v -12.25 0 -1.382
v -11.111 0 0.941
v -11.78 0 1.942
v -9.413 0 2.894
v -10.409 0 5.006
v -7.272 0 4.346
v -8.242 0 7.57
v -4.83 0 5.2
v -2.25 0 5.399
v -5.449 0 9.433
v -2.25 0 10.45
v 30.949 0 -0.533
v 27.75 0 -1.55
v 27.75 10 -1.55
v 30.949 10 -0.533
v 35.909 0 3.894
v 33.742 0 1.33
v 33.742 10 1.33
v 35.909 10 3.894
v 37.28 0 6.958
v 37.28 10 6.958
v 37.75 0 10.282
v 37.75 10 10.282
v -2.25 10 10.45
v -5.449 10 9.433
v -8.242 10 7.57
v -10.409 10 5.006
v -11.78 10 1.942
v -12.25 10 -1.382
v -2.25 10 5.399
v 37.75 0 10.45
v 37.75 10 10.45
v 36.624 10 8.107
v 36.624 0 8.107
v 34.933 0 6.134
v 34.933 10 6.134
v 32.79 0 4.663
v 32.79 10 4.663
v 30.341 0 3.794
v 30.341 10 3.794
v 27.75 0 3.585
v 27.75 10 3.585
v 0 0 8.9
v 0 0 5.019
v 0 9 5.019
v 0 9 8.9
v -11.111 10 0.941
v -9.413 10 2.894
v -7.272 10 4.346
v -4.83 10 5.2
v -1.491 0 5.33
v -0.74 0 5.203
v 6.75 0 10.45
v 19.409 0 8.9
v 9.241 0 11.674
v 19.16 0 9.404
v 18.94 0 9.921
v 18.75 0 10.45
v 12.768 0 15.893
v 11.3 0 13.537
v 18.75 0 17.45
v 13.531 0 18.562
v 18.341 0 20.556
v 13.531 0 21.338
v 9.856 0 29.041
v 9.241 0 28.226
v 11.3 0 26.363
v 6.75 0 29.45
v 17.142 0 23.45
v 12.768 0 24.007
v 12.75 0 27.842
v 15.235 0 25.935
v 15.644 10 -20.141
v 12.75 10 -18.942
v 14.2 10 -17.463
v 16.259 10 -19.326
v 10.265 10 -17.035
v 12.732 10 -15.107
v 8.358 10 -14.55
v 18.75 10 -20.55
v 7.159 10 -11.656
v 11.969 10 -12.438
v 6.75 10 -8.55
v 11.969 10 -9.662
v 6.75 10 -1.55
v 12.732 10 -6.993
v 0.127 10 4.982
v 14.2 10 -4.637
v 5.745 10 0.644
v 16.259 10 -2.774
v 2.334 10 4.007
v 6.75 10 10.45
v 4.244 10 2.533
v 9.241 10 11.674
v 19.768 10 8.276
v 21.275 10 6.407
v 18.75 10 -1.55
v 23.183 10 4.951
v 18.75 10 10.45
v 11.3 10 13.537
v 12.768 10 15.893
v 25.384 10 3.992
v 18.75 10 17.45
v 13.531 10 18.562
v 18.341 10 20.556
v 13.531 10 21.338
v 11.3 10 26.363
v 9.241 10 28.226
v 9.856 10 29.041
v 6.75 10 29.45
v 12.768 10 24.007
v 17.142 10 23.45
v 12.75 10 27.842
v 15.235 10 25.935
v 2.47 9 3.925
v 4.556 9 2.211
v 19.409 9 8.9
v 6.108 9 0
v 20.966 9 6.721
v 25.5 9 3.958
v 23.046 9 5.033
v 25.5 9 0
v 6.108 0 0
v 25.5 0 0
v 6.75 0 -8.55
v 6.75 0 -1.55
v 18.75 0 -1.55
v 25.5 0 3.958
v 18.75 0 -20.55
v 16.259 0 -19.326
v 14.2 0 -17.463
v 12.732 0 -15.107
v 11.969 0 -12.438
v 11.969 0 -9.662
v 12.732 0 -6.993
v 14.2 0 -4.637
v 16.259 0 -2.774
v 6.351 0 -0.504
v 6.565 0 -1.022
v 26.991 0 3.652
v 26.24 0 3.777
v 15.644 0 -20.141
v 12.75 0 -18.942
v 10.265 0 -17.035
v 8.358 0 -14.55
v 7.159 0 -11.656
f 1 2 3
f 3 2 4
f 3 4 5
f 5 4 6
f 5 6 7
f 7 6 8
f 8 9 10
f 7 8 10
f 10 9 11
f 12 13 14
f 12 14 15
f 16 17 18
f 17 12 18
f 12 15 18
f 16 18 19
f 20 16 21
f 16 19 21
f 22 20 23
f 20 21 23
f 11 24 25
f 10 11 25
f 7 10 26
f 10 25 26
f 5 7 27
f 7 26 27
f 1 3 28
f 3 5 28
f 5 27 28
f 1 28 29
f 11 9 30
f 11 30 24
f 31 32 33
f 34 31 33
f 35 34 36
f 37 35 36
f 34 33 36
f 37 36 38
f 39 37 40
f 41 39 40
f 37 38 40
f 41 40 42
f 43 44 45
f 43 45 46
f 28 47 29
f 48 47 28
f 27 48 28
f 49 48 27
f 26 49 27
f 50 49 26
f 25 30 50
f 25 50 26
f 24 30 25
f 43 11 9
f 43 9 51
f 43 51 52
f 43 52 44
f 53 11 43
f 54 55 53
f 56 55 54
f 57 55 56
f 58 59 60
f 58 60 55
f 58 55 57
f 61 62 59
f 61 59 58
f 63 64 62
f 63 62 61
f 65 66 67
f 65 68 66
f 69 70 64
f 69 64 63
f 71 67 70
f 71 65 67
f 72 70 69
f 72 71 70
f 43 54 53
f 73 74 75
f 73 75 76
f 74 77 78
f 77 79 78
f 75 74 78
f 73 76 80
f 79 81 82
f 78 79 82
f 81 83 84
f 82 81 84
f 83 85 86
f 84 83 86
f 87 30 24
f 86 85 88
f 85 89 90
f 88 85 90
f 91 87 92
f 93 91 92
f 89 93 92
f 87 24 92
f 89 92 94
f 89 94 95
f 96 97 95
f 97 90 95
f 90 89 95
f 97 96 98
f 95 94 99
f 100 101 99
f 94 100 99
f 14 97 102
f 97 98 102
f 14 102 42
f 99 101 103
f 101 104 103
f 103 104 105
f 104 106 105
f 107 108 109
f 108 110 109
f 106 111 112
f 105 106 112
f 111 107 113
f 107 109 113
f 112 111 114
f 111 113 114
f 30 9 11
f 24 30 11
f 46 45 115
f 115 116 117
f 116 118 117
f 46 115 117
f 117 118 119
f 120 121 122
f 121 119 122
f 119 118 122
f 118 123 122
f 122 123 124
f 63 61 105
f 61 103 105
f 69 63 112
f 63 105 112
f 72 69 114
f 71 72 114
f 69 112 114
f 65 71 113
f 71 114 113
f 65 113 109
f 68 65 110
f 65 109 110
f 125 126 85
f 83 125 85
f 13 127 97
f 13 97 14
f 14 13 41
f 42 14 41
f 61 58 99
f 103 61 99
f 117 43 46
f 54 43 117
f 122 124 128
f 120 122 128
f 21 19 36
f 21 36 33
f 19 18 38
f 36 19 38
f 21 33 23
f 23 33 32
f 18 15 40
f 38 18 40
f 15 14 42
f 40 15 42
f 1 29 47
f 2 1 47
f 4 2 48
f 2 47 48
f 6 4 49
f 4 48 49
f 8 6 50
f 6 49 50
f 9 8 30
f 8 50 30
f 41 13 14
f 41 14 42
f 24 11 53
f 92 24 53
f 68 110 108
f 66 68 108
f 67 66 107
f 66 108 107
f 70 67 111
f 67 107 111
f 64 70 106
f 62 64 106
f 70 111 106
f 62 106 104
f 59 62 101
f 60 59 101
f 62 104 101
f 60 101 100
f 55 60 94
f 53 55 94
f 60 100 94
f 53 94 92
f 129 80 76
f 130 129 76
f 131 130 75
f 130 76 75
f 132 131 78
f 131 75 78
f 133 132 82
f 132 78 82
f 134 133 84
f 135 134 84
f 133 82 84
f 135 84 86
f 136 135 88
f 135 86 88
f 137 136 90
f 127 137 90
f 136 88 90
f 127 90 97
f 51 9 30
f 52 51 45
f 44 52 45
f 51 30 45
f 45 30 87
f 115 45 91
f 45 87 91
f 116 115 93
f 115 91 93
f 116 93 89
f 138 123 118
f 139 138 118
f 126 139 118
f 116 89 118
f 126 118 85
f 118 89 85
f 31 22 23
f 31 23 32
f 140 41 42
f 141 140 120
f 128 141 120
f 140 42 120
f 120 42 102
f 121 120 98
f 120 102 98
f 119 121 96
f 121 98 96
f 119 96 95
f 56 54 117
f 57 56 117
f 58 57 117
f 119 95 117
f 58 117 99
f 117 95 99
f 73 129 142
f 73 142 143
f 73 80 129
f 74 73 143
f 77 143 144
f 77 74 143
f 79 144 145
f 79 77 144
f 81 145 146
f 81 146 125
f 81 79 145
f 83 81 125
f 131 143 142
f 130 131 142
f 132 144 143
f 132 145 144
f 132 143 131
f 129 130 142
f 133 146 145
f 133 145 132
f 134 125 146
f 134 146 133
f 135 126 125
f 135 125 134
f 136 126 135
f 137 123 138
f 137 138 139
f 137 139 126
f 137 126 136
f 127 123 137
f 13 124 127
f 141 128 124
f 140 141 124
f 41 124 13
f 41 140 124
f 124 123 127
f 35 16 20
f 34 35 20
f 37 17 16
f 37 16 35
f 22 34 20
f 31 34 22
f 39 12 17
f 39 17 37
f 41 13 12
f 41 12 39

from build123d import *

# Parameters (mm, degrees)
F0_W           = 25.5
F0_H           = 8.9
F1_DEPTH       = 8.9
F2_W           = 30
F2_H           = 12
F2_W_2         = 25.5
F2_H_2         = 8.9
F3_DEPTH       = 10
F4_DEPTH       = 9
F5_DEPTH       = 10
F6_DEPTH       = 10
F8_DEPTH       = 19
F10_DEPTH      = 19
F11_F1_R       = 11.9999
F11_F2_R       = 11.9999
F11_2_T1_DEPTH = 69.160797831
F11_3_T1_DEPTH = 69.160797831
F13_DEPTH      = 10


# Not quite as in the source:
# - a fillet or chamfer that OpenCascade refuses, or shapes differently, is made with other operations: its cross-section is extruded or revolved along the edge and cut away or added
# - a fillet or chamfer is up to 0.001 mm smaller than in the source, because OpenCascade refuses the exact size


with BuildPart() as f1:
    # F0 (on Top) → F1 (new body)
    with BuildSketch(Plane.XY):
        with Locations((12.75, 4.45)):
            Rectangle(F0_W, F0_H)
    extrude(amount=F1_DEPTH)


with BuildPart() as f3:
    # F2 (on face) → F3 (new body)
    with BuildSketch(Plane.XZ):
        with Locations((12.75, 4.45)):
            Rectangle(F2_W, F2_H)
        with Locations((12.75, 4.45)):
            Rectangle(F2_W_2, F2_H_2, mode=Mode.SUBTRACT)
        with Locations((12.75, 4.45)):
            Rectangle(F2_W_2, F2_H_2)
    extrude(amount=-F3_DEPTH)


with BuildPart() as f4_tool:
    # F4 (cut): a face of the model
    f4_faces = [f1.part.faces().sort_by_distance(p)[0] for p in [
        (12.75, 0, 4.45),
    ]]
    extrude(f4_faces, amount=-F4_DEPTH)


with BuildPart() as f1_1:
    add(f1.part)

    # F4: cut by f4_tool
    add(f4_tool.part, mode=Mode.SUBTRACT)


with BuildPart() as f3_1:
    add(f3.part)

    # F4: cut by f4_tool
    add(f4_tool.part, mode=Mode.SUBTRACT)


with BuildPart() as f5:
    # F5 (new): a face of the model
    f5_faces = [f3_1.part.faces().sort_by_distance(p)[0] for p in [
        (-2.25, 5, 4.45),
    ]]
    extrude(f5_faces, amount=F5_DEPTH)

    # F11#2: fillet of radius 12 on 1 edges, made by hand

    # F11_2_s2 → F11_2_t1 (cut)
    with BuildSketch(Plane.XZ.offset(-39.5803989155)):
        with BuildLine():
            ThreePointArc((-2.25, 10.45), (-9.4151513899, 6.3638071262), (-12.25, -1.3821595662))
            Line((-12.25, -1.3821595662), (-12.25, 10.45))
            Line((-12.25, 10.45), (-2.25, 10.45))
        make_face()
    extrude(amount=F11_2_T1_DEPTH, mode=Mode.SUBTRACT)


with BuildPart() as f6:
    # F6 (new): a face of the model
    f6_faces = [f3_1.part.faces().sort_by_distance(p)[0] for p in [
        (27.75, 5, 4.45),
    ]]
    extrude(f6_faces, amount=F6_DEPTH)

    # F11#3: fillet of radius 12 on 1 edges, made by hand

    # F11_3_s2 → F11_3_t1 (cut)
    with BuildSketch(Plane.XZ.offset(-39.5803989155)):
        with BuildLine():
            ThreePointArc((27.75, -1.55), (34.9151513899, 2.5361928738), (37.75, 10.2821595662))
            Line((37.75, 10.2821595662), (37.75, -1.55))
            Line((37.75, -1.55), (27.75, -1.55))
        make_face()
    extrude(amount=F11_3_T1_DEPTH, mode=Mode.SUBTRACT)


with BuildPart() as f3_2:
    add(f3_1.part)

    # F7 (on face) → F8 (join)
    with BuildSketch(Plane.XY.offset(10.45)):
        Polygon((6.75, 0), (12.75, 0), (18.75, 0), (18.75, 10), (12.75, 10), (6.75, 10), align=None)
    extrude(amount=F8_DEPTH)

    # F9 (on face) → F10 (join)
    with BuildSketch(Plane(origin=(0, 0, -1.55), x_dir=(1, 0, 0), z_dir=(0, 0, -1))):
        Polygon((6.75, -10), (12.75, -10), (18.75, -10), (18.75, 0), (12.75, 0), (6.75, 0), align=None)
    extrude(amount=F10_DEPTH)

    # F11: fillet of radius 12 on 2 edges, made by hand

    # F11_f1 (radius 12 in the source; OpenCascade refuses exactly that, so slightly less here)
    f11_f1_edges = [f3_2.edges().sort_by_distance(p)[0] for p in [
        (18.75, 5, 29.45),
    ]]
    fillet(f11_f1_edges, radius=F11_F1_R)

    # F11_f2 (radius 12 in the source; OpenCascade refuses exactly that, so slightly less here)
    f11_f2_edges = [f3_2.edges().sort_by_distance(p)[0] for p in [
        (6.75, 5, -20.55),
    ]]
    fillet(f11_f2_edges, radius=F11_F2_R)


with BuildPart() as f13_tool:
    # F12 (on face) → F13 (new body)
    with BuildSketch(Plane(origin=(0, 10, 0), x_dir=(-1, 0, 0), z_dir=(0, 1, 0))):
        with BuildLine():
            Line((-27.75, 3.5850068215), (-27.75, 10.45))
            Line((-27.75, 10.45), (-37.75, 10.45))
            ThreePointArc((-37.75, 10.45), (-33.9096848707, 5.3282302527), (-27.75, 3.5850068215))
        make_face()
        with BuildLine():
            ThreePointArc((-27.75, 3.5850068215), (-22.1851807253, 5.6215262811), (-18.75, 10.45))
            Line((-18.75, 10.45), (-27.75, 10.45))
            Line((-27.75, 10.45), (-27.75, 3.5850068215))
        make_face()
        with BuildLine():
            ThreePointArc((-6.75, 29.45), (-13.6275010008, 19.95), (-6.75, 10.45))
            Line((-6.75, 10.45), (-6.75, 29.45))
        make_face()
        with BuildLine():
            Line((2.25, 5.3987446019), (2.25, -1.55))
            Line((2.25, -1.55), (12.25, -1.55))
            Line((12.25, -1.55), (12.25, -1.3821595662))
            ThreePointArc((12.25, -1.3821595662), (8.389860126, 3.6892779702), (2.25, 5.3987446019))
        make_face()
        with BuildLine():
            ThreePointArc((2.25, 5.3987446019), (-3.3337079529, 3.3279886569), (-6.75, -1.55))
            Line((-6.75, -1.55), (2.25, -1.55))
            Line((2.25, -1.55), (2.25, 5.3987446019))
        make_face()
        with BuildLine():
            ThreePointArc((-18.75, -20.55), (-11.8724989992, -11.05), (-18.75, -1.55))
            Line((-18.75, -1.55), (-18.75, -20.55))
        make_face()
    extrude(amount=-F13_DEPTH)


with BuildPart() as f3_3:
    add(f3_2.part)

    # F13: cut by f13_tool
    add(f13_tool.part, mode=Mode.SUBTRACT)


with BuildPart() as f5_1:
    add(f5.part)

    # F13: cut by f13_tool
    add(f13_tool.part, mode=Mode.SUBTRACT)


with BuildPart() as f6_1:
    add(f6.part)

    # F13: cut by f13_tool
    add(f13_tool.part, mode=Mode.SUBTRACT)


solid = Compound([f3_3.part, f5_1.part, f6_1.part])
